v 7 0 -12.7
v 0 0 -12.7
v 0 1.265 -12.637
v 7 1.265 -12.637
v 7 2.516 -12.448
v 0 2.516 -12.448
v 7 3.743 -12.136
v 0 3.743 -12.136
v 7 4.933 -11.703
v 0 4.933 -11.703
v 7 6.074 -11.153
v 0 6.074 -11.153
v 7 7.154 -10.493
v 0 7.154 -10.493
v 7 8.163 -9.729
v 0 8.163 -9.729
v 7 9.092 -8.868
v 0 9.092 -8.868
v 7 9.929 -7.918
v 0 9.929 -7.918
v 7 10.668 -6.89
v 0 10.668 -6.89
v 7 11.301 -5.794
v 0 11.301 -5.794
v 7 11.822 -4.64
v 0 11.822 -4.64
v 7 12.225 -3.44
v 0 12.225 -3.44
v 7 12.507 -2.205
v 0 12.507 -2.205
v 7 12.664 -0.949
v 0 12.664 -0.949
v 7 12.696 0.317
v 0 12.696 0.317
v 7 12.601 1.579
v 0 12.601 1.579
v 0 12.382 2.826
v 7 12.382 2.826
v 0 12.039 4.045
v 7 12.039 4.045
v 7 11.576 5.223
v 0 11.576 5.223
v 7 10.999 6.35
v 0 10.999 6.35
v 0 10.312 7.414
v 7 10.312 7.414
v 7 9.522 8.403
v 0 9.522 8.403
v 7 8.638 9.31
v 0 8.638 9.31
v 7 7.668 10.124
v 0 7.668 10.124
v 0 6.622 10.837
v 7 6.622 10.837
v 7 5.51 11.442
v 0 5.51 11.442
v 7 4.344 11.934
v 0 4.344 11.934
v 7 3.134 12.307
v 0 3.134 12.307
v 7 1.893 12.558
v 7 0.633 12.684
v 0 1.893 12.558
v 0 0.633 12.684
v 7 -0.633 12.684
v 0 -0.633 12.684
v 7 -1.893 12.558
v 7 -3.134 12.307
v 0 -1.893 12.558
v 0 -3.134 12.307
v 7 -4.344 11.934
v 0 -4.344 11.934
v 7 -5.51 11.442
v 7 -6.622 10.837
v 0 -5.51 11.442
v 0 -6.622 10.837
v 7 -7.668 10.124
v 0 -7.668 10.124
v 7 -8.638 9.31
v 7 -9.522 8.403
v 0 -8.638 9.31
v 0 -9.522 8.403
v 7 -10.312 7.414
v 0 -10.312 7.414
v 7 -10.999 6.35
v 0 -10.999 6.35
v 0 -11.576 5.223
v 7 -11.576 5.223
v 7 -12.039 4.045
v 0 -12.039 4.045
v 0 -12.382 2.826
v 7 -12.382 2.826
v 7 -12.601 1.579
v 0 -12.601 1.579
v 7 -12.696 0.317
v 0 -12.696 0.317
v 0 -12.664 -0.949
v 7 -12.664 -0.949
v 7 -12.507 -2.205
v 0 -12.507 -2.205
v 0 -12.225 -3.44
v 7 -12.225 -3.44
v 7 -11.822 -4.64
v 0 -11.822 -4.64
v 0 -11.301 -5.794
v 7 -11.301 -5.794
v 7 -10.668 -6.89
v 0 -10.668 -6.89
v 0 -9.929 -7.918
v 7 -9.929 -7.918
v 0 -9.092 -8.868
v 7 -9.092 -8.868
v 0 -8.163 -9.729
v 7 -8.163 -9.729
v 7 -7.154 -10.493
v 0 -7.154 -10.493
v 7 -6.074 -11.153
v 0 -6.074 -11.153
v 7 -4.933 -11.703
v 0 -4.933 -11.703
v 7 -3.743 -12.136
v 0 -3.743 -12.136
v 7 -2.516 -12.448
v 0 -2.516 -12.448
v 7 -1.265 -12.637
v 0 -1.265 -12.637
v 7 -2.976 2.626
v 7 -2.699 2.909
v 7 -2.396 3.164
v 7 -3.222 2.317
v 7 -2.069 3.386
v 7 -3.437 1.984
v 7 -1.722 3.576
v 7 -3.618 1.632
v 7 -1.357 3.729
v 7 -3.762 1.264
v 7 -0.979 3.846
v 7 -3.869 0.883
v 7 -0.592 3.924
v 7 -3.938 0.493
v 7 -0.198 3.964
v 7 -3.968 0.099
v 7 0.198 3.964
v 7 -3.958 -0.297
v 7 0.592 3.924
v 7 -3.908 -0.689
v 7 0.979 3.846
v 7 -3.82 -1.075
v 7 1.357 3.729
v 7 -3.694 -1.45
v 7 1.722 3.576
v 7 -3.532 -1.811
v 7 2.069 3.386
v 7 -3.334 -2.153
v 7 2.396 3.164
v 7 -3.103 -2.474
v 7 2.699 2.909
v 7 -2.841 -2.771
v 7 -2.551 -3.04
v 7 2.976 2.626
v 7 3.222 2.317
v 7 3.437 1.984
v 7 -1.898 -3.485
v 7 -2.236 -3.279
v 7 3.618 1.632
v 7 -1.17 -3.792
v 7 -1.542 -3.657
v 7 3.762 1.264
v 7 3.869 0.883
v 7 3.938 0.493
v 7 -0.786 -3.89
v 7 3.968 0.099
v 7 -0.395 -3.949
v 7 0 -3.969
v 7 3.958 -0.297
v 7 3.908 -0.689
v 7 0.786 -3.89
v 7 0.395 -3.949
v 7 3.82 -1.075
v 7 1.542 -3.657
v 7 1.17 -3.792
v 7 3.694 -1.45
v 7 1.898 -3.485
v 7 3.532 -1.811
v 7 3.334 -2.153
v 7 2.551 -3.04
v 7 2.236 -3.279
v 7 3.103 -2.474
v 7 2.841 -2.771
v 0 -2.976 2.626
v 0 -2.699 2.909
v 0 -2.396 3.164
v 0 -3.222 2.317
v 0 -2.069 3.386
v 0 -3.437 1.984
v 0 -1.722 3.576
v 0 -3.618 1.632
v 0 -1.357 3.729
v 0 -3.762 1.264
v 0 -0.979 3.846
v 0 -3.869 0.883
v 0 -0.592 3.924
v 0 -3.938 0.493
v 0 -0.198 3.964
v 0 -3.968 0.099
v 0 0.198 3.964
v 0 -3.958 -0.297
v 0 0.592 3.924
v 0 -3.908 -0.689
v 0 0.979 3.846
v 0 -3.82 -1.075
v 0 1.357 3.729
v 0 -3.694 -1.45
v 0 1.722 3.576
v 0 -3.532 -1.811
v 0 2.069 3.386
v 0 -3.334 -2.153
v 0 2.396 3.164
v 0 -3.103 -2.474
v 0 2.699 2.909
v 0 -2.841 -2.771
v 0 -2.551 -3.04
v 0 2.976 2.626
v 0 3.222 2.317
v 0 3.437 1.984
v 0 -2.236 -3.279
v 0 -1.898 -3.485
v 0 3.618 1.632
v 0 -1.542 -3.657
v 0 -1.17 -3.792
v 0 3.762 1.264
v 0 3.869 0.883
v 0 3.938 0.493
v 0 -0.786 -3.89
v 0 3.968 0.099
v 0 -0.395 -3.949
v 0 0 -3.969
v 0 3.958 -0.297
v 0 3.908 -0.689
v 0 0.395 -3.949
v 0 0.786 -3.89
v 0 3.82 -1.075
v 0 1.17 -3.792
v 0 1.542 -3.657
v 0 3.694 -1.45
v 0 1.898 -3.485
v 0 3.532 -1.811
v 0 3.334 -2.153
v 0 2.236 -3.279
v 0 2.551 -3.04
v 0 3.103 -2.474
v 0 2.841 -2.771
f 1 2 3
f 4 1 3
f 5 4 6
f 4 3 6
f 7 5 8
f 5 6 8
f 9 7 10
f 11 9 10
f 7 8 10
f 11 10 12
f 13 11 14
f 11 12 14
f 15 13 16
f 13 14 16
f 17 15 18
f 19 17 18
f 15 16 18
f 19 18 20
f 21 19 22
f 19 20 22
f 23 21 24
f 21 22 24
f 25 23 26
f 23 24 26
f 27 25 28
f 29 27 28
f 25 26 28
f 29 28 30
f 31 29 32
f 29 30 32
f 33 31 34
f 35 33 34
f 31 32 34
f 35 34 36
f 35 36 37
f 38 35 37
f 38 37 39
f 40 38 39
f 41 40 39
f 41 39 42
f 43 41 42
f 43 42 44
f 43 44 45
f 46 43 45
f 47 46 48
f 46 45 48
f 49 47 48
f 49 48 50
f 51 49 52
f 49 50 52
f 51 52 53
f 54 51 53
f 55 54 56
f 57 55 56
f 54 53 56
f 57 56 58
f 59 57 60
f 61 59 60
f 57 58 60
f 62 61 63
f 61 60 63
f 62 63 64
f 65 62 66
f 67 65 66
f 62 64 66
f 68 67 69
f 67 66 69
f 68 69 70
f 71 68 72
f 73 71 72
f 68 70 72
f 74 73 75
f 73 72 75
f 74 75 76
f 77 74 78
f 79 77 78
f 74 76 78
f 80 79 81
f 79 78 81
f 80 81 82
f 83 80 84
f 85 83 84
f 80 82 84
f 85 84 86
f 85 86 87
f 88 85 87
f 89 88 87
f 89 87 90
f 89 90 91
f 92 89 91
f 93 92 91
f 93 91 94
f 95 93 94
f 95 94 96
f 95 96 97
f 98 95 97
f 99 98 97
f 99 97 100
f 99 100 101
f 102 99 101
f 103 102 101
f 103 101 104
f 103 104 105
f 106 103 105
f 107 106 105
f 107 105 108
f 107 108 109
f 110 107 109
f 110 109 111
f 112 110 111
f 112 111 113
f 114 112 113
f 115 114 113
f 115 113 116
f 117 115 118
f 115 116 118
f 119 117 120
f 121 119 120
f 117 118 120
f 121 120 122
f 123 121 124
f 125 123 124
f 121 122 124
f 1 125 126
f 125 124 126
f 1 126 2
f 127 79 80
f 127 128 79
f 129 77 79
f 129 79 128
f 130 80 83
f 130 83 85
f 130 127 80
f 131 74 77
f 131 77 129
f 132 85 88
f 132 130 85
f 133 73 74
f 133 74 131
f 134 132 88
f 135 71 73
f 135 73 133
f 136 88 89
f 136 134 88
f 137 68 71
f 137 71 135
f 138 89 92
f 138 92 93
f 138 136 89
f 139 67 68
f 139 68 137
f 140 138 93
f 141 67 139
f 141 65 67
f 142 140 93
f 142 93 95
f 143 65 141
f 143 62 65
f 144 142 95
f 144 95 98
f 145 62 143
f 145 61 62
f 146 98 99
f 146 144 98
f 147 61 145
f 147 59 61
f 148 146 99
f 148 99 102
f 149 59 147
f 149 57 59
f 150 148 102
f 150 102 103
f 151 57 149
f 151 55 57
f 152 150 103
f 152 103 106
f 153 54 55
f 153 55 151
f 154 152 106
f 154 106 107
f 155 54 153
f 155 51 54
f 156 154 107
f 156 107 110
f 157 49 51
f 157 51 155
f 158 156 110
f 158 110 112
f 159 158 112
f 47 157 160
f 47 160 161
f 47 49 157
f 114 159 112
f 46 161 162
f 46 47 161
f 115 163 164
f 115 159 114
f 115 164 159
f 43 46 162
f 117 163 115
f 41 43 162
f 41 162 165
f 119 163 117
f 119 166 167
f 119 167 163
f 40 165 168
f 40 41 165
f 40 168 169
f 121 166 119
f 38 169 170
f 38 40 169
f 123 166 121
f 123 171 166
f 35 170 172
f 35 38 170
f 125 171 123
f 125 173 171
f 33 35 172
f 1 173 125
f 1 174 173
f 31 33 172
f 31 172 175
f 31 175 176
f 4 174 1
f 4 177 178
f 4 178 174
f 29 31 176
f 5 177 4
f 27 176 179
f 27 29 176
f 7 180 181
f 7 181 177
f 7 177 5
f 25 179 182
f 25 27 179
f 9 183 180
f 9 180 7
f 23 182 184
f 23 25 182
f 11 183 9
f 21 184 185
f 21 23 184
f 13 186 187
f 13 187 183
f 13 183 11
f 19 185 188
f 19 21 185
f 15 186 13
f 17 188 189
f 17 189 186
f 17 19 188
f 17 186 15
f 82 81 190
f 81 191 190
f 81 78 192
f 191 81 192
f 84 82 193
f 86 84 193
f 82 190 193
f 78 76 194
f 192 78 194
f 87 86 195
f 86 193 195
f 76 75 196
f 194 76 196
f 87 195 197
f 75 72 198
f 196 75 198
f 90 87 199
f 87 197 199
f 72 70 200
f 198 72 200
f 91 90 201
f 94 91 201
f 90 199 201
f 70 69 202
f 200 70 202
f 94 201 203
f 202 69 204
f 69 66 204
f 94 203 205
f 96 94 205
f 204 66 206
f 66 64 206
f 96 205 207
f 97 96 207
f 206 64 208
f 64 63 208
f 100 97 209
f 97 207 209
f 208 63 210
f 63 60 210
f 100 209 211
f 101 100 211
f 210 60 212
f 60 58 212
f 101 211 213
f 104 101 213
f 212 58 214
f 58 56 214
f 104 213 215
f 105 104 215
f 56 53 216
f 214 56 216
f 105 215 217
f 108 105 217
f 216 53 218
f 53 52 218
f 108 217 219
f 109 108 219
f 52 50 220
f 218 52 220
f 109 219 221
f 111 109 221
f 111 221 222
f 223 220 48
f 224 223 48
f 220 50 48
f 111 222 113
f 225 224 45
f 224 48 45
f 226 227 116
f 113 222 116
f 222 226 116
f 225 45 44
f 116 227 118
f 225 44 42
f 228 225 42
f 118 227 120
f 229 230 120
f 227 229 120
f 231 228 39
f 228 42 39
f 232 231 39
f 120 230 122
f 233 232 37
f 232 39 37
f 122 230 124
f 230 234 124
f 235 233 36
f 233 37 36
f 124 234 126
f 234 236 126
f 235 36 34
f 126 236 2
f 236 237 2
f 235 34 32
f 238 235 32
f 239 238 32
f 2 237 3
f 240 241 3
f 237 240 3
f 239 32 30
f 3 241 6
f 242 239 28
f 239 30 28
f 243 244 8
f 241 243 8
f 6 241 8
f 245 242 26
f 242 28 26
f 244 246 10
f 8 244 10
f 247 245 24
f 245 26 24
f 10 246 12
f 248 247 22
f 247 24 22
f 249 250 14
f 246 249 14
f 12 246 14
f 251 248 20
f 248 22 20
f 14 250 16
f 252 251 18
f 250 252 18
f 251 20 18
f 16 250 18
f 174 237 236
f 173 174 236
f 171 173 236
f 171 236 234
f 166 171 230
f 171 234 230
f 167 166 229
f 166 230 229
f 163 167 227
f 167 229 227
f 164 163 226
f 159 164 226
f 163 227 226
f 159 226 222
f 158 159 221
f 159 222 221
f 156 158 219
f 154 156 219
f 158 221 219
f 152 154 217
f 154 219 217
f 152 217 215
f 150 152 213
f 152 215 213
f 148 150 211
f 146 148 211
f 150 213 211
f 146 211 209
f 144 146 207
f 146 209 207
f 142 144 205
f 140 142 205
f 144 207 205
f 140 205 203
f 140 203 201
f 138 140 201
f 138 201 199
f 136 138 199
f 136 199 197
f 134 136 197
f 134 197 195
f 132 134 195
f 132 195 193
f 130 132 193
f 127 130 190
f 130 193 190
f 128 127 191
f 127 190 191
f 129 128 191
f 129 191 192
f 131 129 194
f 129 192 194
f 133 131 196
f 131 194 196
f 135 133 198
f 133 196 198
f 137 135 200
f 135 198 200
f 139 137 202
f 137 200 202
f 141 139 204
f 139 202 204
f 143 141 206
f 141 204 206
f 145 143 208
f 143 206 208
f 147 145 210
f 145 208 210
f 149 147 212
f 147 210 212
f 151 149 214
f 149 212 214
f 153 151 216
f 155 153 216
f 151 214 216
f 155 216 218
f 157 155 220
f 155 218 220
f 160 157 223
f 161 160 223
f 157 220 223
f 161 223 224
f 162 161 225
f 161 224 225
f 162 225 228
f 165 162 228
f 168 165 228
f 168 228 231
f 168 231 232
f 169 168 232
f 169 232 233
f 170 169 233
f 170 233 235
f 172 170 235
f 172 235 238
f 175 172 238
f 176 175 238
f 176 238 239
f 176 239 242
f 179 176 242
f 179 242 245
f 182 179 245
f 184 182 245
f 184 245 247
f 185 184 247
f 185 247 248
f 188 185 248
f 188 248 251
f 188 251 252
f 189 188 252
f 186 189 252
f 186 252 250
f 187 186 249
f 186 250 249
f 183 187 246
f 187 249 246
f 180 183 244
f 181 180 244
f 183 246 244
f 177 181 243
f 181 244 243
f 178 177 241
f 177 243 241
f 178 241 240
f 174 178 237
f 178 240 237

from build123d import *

# Parameters (mm, degrees)
SKETCH001_R         = 3.96875
EXTRUDE001_DEPTH    = 7
SKETCH_R            = 12.7
EXTRUDE_DEPTH       = 7
CUT_PLACEMENT_ANGLE = 90


with BuildPart() as extrude001:
    # Sketch001 (on Face2 of Extrude) → Extrude001 (new body)
    with BuildSketch(Plane(origin=(0, 0, 0), x_dir=(1, 0, 0), z_dir=(0, 0, -1))):
        Circle(SKETCH001_R)
    extrude(amount=-EXTRUDE001_DEPTH)


with BuildPart() as balerox:
    # Sketch → Extrude (new body)
    with BuildSketch(Plane.XY):
        Circle(SKETCH_R)
    extrude(amount=EXTRUDE_DEPTH)

    # Cut: cut Extrude001
    add(extrude001.part, mode=Mode.SUBTRACT)


with BuildPart() as balerox_1:
    # Cut placement: moved
    add(balerox.part.rotate(Axis((0, 0, 0), (0, 1, 0)), CUT_PLACEMENT_ANGLE))


solid = balerox_1.part
